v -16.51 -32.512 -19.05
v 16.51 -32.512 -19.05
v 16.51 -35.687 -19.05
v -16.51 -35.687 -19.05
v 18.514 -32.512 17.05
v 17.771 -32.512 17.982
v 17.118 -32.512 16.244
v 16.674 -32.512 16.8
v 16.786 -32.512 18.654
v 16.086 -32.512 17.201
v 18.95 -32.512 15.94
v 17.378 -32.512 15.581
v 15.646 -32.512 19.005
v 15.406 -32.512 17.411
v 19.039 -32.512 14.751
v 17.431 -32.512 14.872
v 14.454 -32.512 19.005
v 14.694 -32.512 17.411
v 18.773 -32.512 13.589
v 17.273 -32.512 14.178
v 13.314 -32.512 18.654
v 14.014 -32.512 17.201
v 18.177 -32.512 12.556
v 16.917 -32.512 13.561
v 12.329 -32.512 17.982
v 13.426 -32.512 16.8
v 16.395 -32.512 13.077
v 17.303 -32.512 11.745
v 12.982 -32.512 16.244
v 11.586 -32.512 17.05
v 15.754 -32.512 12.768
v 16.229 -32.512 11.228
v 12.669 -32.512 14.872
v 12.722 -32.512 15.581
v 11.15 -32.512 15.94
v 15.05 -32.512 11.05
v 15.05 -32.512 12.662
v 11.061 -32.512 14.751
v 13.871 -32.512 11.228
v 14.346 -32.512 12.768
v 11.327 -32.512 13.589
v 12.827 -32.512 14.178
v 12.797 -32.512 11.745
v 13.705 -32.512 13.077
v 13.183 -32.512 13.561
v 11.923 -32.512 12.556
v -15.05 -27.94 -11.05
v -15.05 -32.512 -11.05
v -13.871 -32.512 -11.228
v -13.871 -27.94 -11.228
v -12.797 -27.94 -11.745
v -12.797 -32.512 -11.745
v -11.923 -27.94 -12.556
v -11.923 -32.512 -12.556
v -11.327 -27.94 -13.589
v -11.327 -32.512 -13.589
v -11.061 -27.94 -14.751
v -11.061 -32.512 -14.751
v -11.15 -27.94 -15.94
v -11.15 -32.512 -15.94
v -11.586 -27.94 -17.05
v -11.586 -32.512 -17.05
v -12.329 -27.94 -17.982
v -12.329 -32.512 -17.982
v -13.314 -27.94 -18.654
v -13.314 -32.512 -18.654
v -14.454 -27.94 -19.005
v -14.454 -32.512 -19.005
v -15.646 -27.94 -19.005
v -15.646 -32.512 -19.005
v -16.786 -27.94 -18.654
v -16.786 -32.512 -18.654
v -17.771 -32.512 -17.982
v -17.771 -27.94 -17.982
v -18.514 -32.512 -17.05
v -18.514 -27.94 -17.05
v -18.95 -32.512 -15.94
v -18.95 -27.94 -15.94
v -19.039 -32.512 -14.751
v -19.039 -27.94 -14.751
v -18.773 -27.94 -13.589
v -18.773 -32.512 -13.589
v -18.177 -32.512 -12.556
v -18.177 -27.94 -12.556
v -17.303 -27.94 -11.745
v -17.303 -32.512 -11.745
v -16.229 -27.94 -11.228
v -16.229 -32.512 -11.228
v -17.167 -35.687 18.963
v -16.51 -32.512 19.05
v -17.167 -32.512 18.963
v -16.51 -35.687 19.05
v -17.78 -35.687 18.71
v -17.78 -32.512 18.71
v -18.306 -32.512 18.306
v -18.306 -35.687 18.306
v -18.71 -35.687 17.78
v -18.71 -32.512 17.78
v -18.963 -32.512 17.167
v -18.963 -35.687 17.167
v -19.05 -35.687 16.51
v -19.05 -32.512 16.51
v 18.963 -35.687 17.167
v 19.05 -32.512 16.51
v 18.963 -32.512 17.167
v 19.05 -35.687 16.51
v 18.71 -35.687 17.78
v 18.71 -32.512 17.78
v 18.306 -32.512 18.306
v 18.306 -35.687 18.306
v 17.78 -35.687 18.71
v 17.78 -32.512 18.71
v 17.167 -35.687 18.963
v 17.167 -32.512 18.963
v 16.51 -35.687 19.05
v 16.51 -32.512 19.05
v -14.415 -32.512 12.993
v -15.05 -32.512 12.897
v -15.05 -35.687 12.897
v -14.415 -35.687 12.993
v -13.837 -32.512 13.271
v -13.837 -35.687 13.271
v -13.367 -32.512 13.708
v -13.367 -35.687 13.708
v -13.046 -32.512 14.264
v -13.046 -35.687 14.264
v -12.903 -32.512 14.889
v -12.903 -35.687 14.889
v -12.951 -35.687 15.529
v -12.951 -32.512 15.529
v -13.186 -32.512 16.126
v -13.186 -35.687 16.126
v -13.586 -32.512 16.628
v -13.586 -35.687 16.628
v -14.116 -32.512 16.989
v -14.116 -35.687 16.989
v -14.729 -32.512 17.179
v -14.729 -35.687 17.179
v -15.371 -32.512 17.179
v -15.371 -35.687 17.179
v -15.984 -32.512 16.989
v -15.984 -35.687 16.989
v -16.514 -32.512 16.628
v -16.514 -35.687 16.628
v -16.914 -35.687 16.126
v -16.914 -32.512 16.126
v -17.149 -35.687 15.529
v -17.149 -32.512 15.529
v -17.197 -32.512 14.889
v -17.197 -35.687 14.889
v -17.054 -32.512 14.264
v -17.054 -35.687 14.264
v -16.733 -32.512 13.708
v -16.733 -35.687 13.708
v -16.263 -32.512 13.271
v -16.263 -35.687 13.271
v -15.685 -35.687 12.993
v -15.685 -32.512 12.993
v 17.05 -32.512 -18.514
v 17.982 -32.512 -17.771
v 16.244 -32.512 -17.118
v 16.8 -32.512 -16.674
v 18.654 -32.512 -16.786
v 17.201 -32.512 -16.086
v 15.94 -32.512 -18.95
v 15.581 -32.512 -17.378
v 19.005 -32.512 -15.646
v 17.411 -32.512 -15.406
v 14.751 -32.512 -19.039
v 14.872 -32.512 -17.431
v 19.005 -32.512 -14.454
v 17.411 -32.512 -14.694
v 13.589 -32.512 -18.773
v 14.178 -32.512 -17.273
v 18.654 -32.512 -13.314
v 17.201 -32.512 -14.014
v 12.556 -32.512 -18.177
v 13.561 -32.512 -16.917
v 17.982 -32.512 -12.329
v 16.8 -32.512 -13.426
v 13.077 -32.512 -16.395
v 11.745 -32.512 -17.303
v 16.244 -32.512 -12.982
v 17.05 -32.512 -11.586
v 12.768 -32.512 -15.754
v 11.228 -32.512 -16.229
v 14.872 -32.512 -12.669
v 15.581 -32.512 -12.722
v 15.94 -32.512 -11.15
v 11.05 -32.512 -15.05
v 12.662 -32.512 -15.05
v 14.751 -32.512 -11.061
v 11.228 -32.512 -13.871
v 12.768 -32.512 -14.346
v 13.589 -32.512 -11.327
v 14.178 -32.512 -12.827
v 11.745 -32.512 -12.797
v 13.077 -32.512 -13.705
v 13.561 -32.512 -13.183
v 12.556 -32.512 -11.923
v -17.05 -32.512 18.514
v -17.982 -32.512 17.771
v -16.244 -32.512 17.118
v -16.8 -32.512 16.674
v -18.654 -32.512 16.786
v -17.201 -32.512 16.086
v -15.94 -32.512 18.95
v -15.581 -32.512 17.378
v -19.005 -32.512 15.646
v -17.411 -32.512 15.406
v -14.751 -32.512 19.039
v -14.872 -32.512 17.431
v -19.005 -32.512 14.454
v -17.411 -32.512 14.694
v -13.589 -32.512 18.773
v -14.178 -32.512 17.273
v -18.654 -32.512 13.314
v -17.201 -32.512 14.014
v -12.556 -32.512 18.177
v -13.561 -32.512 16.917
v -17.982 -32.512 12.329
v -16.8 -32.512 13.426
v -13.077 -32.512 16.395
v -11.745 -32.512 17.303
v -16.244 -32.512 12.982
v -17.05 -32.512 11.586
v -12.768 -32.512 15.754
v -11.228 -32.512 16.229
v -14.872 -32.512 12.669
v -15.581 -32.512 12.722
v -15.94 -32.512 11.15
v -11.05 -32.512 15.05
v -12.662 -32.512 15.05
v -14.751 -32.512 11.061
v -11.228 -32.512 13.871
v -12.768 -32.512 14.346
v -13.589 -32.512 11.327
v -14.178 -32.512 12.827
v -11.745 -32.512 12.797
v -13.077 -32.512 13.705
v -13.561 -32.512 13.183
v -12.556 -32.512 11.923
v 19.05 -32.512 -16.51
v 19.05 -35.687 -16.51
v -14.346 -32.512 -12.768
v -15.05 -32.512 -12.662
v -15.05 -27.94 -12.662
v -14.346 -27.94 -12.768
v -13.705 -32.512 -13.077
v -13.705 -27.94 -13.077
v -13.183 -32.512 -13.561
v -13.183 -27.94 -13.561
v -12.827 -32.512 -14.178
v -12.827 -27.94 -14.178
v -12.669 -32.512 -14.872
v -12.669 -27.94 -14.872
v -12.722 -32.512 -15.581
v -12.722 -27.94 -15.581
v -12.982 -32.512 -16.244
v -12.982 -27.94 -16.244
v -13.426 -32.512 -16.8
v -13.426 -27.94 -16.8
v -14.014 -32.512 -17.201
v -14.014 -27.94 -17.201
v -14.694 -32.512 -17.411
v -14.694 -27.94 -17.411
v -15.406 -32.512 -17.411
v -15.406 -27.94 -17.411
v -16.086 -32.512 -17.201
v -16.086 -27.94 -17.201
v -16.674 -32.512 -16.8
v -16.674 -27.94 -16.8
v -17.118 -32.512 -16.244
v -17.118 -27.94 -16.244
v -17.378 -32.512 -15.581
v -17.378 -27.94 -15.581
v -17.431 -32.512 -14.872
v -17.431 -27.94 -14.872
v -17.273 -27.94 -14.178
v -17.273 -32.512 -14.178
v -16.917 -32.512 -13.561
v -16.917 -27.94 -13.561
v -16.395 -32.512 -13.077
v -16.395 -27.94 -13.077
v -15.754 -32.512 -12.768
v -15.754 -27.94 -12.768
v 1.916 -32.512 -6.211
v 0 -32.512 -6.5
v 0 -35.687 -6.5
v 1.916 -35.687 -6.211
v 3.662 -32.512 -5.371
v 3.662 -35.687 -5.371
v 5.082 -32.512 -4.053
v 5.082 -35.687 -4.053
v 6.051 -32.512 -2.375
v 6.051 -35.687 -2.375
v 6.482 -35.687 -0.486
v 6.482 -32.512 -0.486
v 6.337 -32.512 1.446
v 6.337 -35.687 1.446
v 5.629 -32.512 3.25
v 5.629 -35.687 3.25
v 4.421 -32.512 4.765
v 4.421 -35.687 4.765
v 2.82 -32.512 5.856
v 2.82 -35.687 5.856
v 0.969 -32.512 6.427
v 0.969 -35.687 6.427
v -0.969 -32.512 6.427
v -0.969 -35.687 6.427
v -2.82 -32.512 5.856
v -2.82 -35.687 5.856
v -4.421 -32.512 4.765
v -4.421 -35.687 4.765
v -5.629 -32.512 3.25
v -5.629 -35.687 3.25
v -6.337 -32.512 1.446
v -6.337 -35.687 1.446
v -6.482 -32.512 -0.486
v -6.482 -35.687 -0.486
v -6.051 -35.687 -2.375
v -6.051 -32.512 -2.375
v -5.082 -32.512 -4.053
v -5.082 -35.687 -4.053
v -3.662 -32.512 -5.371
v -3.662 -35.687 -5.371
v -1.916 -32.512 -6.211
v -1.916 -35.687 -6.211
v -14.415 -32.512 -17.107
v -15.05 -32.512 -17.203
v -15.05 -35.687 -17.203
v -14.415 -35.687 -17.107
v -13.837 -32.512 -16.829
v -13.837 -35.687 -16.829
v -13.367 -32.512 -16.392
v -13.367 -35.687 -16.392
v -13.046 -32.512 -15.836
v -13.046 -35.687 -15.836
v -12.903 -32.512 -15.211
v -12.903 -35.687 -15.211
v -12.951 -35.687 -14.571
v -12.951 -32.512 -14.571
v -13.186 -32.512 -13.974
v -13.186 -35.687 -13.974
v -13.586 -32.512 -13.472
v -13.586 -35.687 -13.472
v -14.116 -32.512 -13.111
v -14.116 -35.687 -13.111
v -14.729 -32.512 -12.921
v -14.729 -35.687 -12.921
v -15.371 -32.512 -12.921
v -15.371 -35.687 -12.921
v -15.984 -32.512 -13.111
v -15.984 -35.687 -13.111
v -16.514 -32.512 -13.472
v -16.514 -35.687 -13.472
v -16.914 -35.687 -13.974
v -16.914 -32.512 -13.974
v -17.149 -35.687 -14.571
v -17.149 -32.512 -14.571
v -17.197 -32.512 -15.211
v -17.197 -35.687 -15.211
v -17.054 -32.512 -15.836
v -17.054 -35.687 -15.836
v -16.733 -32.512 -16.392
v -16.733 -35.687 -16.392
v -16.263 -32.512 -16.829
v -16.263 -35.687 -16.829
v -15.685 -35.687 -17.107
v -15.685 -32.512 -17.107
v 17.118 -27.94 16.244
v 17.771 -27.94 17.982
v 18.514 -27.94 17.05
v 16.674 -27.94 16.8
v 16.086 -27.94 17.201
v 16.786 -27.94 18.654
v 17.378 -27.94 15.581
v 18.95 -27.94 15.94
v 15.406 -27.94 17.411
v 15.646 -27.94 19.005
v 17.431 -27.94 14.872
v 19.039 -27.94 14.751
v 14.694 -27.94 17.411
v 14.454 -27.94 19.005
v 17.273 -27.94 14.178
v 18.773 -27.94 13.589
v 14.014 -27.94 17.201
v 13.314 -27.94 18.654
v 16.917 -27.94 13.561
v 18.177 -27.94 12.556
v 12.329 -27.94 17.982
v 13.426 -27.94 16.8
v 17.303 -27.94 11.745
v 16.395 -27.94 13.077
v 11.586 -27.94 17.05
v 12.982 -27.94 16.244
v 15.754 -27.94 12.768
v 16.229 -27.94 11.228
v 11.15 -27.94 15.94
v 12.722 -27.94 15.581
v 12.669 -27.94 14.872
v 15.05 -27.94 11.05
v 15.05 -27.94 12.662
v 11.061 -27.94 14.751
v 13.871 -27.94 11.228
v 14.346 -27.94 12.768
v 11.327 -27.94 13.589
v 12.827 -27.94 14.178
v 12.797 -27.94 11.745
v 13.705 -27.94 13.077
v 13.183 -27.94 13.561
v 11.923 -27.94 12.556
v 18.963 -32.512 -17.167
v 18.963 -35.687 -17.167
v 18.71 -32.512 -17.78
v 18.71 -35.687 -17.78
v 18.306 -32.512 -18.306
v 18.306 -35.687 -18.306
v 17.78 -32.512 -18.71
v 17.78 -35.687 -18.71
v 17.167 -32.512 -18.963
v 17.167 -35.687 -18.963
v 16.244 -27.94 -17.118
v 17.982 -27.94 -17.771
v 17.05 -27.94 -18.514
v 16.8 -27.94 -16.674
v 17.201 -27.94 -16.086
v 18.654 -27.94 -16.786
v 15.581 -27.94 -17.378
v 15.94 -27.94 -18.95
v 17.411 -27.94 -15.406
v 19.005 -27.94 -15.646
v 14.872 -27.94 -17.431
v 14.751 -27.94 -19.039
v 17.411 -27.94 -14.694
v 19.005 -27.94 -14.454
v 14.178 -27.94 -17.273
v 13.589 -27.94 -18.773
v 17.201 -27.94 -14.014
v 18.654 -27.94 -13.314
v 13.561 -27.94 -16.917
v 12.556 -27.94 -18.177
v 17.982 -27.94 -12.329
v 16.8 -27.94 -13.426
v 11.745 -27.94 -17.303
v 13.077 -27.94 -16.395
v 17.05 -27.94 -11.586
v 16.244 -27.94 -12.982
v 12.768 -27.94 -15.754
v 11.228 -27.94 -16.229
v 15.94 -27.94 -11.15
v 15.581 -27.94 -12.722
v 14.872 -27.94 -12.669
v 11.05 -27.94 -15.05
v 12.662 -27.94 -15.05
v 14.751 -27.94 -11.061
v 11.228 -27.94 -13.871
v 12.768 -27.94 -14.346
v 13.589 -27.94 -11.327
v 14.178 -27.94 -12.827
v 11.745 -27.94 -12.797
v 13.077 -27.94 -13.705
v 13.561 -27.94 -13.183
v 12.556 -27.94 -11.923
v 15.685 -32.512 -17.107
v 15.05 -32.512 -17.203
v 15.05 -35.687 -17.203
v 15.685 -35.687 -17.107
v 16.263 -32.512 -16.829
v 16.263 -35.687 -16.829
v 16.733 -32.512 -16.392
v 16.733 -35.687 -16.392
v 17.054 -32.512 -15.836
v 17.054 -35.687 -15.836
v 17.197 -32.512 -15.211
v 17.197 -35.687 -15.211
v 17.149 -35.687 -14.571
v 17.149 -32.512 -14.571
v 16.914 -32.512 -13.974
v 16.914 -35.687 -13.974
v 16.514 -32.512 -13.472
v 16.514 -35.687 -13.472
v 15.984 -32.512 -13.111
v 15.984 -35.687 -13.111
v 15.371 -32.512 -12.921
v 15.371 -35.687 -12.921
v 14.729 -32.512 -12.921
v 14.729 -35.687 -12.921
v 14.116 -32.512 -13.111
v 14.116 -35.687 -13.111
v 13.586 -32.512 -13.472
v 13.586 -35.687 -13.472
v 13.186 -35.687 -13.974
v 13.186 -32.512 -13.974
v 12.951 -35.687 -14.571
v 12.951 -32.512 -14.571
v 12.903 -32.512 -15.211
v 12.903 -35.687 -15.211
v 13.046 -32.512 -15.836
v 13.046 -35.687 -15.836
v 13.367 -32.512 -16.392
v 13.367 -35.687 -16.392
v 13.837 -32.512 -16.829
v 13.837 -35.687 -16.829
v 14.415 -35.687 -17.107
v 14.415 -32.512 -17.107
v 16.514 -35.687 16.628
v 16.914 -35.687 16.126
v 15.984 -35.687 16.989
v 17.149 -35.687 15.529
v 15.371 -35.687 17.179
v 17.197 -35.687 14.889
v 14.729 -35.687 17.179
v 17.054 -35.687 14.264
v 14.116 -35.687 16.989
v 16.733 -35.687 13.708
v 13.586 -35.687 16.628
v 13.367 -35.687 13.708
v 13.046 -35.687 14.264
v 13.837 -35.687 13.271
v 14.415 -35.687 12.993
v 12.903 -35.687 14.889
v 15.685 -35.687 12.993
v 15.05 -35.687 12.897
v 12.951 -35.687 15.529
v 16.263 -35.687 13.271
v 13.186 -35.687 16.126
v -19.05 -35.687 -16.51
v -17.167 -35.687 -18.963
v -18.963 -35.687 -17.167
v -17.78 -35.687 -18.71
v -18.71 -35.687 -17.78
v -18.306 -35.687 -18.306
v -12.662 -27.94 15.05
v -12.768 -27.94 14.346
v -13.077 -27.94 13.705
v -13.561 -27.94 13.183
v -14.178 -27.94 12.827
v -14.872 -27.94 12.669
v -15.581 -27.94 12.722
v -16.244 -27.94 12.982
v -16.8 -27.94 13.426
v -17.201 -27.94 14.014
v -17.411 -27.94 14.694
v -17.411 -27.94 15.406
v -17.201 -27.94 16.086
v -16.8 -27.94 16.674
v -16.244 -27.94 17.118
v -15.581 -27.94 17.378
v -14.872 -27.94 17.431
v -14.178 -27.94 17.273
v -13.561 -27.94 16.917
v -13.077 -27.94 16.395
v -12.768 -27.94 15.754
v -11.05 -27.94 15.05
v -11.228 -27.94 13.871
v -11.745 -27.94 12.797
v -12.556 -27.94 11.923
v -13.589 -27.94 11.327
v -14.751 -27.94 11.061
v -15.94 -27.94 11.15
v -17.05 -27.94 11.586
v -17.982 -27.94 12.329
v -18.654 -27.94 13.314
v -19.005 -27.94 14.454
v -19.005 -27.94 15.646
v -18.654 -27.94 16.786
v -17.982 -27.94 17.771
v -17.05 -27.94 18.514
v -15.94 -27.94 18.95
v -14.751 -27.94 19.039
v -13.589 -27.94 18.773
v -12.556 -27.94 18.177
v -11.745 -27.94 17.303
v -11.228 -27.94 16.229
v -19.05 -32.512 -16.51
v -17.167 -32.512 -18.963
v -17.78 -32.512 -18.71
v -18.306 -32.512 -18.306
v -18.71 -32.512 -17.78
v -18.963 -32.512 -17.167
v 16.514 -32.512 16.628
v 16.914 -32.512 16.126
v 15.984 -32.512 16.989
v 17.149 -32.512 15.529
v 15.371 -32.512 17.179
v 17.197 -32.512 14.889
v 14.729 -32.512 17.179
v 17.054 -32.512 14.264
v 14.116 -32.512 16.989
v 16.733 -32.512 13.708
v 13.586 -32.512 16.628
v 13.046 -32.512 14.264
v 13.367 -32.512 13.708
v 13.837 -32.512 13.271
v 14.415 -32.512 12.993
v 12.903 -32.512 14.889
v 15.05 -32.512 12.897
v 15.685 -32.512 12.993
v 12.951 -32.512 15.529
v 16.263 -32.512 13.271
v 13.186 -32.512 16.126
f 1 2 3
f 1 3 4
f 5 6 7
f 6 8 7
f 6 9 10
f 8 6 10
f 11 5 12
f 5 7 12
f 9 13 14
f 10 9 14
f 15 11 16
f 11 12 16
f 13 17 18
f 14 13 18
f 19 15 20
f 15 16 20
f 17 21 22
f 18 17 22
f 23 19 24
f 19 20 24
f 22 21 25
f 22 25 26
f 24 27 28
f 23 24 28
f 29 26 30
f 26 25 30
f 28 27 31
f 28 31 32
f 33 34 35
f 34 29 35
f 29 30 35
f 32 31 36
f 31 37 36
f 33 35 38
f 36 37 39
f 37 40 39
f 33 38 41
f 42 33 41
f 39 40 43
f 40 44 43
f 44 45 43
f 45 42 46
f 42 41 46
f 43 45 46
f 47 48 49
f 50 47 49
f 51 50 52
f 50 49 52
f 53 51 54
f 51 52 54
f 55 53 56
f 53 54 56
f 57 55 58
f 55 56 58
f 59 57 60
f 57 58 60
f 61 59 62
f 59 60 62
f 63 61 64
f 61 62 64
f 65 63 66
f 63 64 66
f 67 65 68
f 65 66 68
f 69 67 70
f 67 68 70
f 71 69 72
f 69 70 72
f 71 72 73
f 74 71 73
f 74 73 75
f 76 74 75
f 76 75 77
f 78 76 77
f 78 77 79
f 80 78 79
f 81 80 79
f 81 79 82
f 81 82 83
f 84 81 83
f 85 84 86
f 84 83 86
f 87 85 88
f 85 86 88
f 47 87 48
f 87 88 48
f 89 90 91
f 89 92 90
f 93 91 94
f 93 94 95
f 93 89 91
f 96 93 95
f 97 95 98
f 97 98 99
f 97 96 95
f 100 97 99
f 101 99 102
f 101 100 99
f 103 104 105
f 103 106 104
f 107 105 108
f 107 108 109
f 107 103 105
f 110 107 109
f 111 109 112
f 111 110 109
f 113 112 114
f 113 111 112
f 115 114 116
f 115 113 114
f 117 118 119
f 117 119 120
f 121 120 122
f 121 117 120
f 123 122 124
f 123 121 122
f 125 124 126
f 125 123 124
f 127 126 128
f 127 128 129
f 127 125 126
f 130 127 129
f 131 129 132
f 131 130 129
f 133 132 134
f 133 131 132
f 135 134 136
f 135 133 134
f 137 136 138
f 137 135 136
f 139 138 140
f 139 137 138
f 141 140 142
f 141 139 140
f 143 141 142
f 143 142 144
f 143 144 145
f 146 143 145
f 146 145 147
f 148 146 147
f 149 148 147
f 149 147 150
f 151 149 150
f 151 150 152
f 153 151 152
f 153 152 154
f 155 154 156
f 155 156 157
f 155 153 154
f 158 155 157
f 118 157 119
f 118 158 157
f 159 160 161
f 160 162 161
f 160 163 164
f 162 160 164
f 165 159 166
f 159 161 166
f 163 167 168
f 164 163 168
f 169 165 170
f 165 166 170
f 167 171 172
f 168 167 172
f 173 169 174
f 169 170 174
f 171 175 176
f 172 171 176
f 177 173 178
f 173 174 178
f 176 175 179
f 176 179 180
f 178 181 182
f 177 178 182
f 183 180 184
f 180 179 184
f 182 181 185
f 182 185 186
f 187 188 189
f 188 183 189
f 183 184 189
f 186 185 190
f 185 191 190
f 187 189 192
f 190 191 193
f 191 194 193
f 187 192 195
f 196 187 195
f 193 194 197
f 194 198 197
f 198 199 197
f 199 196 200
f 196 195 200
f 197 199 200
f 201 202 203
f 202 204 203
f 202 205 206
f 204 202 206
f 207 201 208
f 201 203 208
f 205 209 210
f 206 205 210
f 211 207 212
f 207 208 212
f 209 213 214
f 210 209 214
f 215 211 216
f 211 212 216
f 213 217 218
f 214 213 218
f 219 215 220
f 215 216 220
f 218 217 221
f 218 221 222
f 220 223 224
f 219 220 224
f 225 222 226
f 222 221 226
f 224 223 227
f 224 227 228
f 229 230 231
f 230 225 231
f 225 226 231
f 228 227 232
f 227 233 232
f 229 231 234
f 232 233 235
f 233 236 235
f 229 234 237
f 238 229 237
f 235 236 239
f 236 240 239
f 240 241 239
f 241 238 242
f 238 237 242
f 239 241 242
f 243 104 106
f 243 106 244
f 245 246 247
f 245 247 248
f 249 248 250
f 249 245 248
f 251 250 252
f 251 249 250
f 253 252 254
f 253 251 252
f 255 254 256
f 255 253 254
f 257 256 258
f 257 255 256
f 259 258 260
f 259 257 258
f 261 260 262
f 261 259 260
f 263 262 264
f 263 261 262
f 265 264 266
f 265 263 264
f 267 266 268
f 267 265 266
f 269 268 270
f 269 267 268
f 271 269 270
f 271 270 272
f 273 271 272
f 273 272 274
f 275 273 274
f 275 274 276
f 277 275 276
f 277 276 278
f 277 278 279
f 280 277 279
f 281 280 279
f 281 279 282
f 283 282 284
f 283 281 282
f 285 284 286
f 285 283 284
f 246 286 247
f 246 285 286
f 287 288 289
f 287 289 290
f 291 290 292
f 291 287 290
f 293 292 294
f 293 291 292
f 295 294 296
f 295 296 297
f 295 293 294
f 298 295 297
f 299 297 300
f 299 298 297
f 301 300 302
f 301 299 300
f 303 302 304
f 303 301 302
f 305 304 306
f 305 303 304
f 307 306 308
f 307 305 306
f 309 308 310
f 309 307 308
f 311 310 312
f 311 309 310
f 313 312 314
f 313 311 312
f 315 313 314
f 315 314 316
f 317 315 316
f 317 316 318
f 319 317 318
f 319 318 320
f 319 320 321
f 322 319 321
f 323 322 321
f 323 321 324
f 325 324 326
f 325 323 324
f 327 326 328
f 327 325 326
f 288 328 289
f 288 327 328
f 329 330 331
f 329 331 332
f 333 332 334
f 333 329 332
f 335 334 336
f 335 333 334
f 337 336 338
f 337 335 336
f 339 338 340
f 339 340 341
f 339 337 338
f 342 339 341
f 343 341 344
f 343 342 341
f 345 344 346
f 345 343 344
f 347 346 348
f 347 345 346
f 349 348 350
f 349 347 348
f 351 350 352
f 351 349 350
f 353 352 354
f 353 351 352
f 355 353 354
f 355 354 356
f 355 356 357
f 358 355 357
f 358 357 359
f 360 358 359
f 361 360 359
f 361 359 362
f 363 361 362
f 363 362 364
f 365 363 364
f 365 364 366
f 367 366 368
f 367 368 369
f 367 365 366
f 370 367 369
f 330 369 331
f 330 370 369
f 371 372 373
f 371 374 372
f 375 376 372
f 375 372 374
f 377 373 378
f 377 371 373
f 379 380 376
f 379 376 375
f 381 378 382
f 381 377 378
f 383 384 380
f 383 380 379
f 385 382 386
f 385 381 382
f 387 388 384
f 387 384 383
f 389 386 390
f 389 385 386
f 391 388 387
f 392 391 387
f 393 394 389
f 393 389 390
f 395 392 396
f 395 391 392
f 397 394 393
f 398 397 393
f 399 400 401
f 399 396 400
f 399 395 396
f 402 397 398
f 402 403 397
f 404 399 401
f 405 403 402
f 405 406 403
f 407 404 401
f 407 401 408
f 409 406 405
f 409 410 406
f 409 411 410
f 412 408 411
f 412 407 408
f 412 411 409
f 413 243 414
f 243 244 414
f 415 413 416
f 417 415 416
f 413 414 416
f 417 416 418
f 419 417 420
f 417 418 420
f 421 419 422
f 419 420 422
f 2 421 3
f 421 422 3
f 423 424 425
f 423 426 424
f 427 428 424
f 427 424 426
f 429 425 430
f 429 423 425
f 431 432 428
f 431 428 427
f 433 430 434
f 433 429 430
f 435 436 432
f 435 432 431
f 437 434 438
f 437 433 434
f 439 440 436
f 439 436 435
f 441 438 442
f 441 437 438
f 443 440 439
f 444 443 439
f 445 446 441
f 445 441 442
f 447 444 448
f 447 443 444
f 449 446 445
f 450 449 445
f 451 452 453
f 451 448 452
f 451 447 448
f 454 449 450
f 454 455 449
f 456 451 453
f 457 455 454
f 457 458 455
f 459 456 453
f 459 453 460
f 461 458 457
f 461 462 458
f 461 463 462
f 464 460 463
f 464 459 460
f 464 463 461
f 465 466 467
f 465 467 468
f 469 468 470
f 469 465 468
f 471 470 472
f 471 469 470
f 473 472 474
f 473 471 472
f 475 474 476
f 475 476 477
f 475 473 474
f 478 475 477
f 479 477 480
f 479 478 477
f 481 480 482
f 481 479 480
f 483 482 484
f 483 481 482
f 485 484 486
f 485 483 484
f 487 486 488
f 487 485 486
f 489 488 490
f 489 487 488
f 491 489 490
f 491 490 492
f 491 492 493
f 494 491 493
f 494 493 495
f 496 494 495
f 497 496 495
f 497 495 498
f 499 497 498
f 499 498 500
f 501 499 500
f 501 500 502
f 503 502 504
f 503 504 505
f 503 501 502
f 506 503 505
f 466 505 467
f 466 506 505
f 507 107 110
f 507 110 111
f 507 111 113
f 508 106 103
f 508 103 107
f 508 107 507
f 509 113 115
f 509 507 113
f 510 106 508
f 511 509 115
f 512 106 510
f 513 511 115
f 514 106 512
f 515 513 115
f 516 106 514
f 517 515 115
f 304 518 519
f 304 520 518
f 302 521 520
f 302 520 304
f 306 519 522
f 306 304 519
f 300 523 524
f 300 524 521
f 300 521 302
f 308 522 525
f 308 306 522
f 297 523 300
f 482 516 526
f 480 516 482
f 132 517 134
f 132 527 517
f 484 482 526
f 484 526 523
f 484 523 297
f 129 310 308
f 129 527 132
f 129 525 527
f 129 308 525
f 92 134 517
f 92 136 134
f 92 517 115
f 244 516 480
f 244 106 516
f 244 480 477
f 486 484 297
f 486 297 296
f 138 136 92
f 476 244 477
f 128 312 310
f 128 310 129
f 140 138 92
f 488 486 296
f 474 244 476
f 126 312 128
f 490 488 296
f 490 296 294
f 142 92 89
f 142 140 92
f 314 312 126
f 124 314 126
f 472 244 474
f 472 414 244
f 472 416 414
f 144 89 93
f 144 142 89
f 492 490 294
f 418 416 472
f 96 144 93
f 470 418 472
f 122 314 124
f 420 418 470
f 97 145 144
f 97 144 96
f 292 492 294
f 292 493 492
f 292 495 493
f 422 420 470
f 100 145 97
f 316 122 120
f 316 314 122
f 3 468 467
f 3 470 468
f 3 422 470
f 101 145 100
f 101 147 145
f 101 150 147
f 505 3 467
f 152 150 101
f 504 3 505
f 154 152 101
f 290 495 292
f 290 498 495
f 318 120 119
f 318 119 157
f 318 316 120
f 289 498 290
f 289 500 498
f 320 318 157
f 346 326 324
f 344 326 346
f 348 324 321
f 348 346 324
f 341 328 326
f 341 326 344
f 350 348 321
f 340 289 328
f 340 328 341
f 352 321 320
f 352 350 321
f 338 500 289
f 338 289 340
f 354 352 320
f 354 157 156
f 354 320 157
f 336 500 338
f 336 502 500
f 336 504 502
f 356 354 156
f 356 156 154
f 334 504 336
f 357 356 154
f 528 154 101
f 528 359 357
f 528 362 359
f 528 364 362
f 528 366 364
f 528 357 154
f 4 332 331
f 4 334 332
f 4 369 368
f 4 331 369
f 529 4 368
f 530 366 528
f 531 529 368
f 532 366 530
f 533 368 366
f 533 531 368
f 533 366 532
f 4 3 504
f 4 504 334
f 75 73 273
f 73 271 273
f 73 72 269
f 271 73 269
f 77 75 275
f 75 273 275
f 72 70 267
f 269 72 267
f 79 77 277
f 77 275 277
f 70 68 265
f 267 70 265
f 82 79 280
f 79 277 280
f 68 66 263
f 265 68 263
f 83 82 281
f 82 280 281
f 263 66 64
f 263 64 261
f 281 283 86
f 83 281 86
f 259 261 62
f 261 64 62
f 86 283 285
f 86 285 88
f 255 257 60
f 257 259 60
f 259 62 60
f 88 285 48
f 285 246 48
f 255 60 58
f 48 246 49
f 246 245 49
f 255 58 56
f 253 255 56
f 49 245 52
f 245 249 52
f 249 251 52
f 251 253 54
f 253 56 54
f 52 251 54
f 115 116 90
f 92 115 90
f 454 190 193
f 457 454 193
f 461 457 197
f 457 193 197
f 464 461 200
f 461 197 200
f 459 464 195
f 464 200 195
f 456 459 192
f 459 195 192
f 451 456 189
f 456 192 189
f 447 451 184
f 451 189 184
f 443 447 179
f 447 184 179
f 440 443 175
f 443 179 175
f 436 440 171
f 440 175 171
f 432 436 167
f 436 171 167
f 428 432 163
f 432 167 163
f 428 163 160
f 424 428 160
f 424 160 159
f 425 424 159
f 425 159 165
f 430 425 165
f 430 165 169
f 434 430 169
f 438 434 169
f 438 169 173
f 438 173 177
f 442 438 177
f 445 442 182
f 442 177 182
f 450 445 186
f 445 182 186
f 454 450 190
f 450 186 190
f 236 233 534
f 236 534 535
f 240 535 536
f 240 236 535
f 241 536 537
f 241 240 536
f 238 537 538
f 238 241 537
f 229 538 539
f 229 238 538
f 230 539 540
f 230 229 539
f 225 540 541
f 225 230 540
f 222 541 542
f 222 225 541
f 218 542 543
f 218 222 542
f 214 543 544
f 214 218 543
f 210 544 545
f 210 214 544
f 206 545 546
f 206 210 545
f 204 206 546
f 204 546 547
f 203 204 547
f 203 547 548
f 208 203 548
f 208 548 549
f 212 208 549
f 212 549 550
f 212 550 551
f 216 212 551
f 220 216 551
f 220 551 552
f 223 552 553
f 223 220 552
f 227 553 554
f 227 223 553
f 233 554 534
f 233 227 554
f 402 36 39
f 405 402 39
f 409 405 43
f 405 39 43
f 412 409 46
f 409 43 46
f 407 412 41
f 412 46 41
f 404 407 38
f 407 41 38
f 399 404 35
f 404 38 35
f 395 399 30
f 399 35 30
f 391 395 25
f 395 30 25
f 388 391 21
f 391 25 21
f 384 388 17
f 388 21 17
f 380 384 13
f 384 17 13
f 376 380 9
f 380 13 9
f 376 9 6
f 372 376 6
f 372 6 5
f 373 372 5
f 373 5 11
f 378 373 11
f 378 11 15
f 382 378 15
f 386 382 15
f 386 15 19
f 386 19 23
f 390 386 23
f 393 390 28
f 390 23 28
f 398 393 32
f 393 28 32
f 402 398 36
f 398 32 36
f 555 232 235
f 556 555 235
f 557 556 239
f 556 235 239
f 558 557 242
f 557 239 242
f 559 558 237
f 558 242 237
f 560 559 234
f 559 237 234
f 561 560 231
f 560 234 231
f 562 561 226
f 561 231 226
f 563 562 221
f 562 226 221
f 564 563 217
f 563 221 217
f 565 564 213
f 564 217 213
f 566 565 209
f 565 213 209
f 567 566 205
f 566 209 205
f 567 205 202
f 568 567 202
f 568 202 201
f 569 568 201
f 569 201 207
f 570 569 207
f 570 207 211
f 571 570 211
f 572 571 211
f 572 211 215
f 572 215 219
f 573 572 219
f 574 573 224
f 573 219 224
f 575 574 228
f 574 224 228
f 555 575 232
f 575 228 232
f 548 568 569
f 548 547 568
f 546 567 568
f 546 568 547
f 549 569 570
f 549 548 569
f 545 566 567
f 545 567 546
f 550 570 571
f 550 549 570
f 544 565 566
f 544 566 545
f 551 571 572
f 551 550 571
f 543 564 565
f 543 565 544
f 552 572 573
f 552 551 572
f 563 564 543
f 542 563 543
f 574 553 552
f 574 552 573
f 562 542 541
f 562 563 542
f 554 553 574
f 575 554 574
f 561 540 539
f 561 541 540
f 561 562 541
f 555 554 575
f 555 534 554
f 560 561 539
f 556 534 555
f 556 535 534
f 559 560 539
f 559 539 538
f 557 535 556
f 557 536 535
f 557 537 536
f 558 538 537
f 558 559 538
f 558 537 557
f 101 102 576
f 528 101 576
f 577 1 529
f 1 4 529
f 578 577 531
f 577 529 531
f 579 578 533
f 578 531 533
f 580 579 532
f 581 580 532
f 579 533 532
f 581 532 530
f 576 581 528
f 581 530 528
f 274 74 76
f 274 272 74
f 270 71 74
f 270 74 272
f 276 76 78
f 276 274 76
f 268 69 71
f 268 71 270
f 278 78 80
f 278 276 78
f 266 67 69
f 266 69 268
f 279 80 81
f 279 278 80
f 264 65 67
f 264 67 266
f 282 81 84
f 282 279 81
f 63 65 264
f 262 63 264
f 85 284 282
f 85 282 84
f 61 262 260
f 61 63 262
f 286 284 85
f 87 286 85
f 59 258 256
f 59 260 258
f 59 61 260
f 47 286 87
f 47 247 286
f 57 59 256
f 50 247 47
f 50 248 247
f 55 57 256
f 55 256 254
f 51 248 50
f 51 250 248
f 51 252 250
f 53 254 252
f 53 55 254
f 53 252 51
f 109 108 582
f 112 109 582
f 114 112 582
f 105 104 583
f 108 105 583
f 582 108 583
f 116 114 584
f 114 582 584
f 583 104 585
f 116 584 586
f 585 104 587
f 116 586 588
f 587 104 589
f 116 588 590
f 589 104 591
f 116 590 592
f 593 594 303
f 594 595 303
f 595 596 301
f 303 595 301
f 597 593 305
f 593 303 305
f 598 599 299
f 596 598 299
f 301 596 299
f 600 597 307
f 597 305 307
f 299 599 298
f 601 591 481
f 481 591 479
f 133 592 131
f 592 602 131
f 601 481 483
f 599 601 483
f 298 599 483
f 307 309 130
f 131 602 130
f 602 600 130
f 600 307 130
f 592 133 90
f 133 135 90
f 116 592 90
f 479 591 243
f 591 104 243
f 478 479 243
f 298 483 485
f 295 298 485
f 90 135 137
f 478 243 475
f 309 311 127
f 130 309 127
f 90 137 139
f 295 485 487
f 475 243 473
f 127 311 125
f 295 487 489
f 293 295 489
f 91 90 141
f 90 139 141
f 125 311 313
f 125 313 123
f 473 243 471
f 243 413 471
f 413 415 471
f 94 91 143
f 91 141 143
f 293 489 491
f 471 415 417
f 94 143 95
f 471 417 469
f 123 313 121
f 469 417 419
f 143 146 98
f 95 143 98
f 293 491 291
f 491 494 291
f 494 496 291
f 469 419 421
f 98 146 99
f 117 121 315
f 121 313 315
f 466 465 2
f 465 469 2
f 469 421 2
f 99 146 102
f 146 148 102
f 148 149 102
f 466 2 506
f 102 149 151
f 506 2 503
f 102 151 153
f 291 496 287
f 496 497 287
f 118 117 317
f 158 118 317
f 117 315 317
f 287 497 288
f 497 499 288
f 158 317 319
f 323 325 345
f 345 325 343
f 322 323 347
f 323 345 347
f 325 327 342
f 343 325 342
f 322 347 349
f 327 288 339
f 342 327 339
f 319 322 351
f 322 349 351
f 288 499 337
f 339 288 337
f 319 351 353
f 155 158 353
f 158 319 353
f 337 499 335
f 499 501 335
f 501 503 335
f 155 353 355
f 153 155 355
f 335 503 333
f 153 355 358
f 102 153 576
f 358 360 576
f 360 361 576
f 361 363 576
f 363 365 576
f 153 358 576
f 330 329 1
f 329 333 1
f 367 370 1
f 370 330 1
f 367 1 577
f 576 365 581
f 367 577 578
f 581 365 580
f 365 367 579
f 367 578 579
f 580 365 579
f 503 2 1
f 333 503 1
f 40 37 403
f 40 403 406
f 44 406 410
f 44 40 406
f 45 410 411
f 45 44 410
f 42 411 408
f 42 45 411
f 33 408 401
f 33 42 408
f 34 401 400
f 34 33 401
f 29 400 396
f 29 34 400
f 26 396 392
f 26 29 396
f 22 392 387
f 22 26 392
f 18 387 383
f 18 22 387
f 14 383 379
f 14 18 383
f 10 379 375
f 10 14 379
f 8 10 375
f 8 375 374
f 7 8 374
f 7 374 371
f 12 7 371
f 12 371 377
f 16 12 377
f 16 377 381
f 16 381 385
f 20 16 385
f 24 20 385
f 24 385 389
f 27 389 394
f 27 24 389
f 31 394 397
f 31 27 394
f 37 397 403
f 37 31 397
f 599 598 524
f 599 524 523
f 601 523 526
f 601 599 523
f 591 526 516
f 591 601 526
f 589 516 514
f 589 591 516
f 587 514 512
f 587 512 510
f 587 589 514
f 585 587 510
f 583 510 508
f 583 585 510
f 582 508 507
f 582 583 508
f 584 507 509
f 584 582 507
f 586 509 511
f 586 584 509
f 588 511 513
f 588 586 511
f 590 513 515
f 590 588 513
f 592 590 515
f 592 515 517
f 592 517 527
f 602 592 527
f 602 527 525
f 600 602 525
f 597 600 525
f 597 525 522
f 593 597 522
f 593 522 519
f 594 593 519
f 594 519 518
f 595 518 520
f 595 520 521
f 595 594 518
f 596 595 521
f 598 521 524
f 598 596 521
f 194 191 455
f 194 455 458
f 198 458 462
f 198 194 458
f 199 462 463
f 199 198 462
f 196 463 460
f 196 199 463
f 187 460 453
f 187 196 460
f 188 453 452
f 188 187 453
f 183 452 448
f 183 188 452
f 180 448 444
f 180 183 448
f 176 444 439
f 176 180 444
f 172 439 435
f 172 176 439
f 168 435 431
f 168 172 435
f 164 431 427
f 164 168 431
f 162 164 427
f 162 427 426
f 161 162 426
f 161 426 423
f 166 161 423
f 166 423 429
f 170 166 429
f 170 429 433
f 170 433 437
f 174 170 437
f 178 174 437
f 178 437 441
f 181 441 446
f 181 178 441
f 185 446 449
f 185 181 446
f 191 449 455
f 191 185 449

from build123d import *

# Parameters (mm, degrees)
SKETCH1_W           = 38.1
SKETCH1_H           = 38.1
SKETCH1_R           = 4
SKETCH1_R_2         = 1.5875
SKETCH1_R_3         = 1.25
BOSS_EXTRUDE1_DEPTH = 3.175
SKETCH4_R           = 1.7272
CUT_EXTRUDE2_DEPTH  = 10.795
SKETCH7_R           = 2.15265
CUT_EXTRUDE3_DEPTH  = 28.679008383
CIRPATTERN1_COUNT   = 4
SKETCH6_W           = 38.1
SKETCH6_H           = 38.1
SKETCH6_R           = 6.5
SKETCH6_R_2         = 2.15265
BOSS_EXTRUDE2_DEPTH = 3.175
FILLET1_R           = 2.54
FILLET2_R           = 2.54
SKETCH8_R           = 4
SKETCH8_R_2         = 2.3876
BOSS_EXTRUDE3_DEPTH = 4.572
CIRPATTERN2_COUNT   = 4


with BuildPart() as part:
    # Sketch1 → Boss-Extrude1 (new, symmetric)
    with BuildSketch(Plane(origin=(0, 0, 0), x_dir=(1, 0, 0), z_dir=(0, 1, 0))):
        Rectangle(SKETCH1_W, SKETCH1_H)
        with Locations(Location((0, 0, 0), (0, 0, 270))):
            Circle(SKETCH1_R, mode=Mode.SUBTRACT)
        with Locations(Location((8.838834765, 8.838834765, 0), (0, 0, 270))):
            Circle(SKETCH1_R_2, mode=Mode.SUBTRACT)
        with Locations(Location((8.838834765, -8.838834765, 0), (0, 0, 270))):
            Circle(SKETCH1_R_2, mode=Mode.SUBTRACT)
        with Locations(Location((-8.838834765, -8.838834765, 0), (0, 0, 270))):
            Circle(SKETCH1_R_2, mode=Mode.SUBTRACT)
        with Locations(Location((-8.838834765, 8.838834765, 0), (0, 0, 270))):
            Circle(SKETCH1_R_2, mode=Mode.SUBTRACT)
        with Locations(Location((-14.5, 0, 0), (0, 0, 270))):
            Circle(SKETCH1_R_3, mode=Mode.SUBTRACT)
        with Locations(Location((0, 14.5, 0), (0, 0, 270))):
            Circle(SKETCH1_R_3, mode=Mode.SUBTRACT)
        with Locations(Location((14.5, 0, 0), (0, 0, 270))):
            Circle(SKETCH1_R_3, mode=Mode.SUBTRACT)
        with Locations(Location((0, -14.5, 0), (0, 0, 270))):
            Circle(SKETCH1_R_3, mode=Mode.SUBTRACT)
    extrude(amount=BOSS_EXTRUDE1_DEPTH, both=True)

    # Sketch4 → Cut-Extrude2 (cut)
    with BuildSketch(Plane.XY.offset(19.05)):
        with Locations((-5.55625, 0)):
            Circle(SKETCH4_R)
        with Locations((5.55625, 0)):
            Circle(SKETCH4_R)
    cut_extrude2 = extrude(amount=-CUT_EXTRUDE2_DEPTH, mode=Mode.SUBTRACT)

    # Sketch7 → Cut-Extrude3 (cut, through all)
    with BuildSketch(Plane.XZ.offset(3.175)):
        with Locations(Location((-15.05, 15.05, 0), (0, 0, 270))):
            Circle(SKETCH7_R)
        with Locations(Location((15.05, 15.05, 0), (0, 0, 270))):
            Circle(SKETCH7_R)
        with Locations(Location((15.05, -15.05, 0), (0, 0, 270))):
            Circle(SKETCH7_R)
        with Locations(Location((-15.05, -15.05, 0), (0, 0, 270))):
            Circle(SKETCH7_R)
    extrude(amount=-CUT_EXTRUDE3_DEPTH, mode=Mode.SUBTRACT)

    # CirPattern1: Cut-Extrude2 ×4 about axis
    cirpattern1_axis = Axis((0, 0, 0), (0, 1, 0))
    for i in range(1, CIRPATTERN1_COUNT):
        add(cut_extrude2.rotate(cirpattern1_axis, i * 360 / CIRPATTERN1_COUNT), mode=Mode.SUBTRACT)

    # Fillet1
    fillet1_edges = [part.edges().sort_by_distance(p)[0] for p in [
        (19.05, 0, 19.05),
        (-19.05, 0, 19.05),
        (-19.05, 0, -19.05),
        (19.05, 0, -19.05),
    ]]
    fillet(fillet1_edges, radius=FILLET1_R)


with BuildPart() as body_2:
    # Sketch6 → Boss-Extrude2 (new body)
    with BuildSketch(Plane(origin=(0, -32.512, 0), x_dir=(-1, 0, 0), z_dir=(0, -1, 0))):
        Rectangle(SKETCH6_W, SKETCH6_H)
        with Locations(Location((0, 0, 0), (0, 0, 90))):
            Circle(SKETCH6_R, mode=Mode.SUBTRACT)
        with Locations(Location((-15.05, 15.05, 0), (0, 0, 90))):
            Circle(SKETCH6_R_2, mode=Mode.SUBTRACT)
        with Locations(Location((15.05, 15.05, 0), (0, 0, 90))):
            Circle(SKETCH6_R_2, mode=Mode.SUBTRACT)
        with Locations(Location((15.05, -15.05, 0), (0, 0, 90))):
            Circle(SKETCH6_R_2, mode=Mode.SUBTRACT)
        with Locations(Location((-15.05, -15.05, 0), (0, 0, 90))):
            Circle(SKETCH6_R_2, mode=Mode.SUBTRACT)
    extrude(amount=BOSS_EXTRUDE2_DEPTH)

    # Fillet2
    fillet2_edges = [body_2.edges().sort_by_distance(p)[0] for p in [
        (-19.05, -34.0995, 19.05),
        (19.05, -34.0995, 19.05),
        (19.05, -34.0995, -19.05),
        (-19.05, -34.0995, -19.05),
    ]]
    fillet(fillet2_edges, radius=FILLET2_R)


with BuildPart() as body_3:
    # Sketch8 → Boss-Extrude3 (new body)
    with BuildSketch(Plane(origin=(0, -32.512, 0), x_dir=(1, 0, 0), z_dir=(0, 1, 0))):
        with Locations(Location((-15.05, 15.05, 0), (0, 0, 270))):
            Circle(SKETCH8_R)
        with Locations(Location((-15.05, 15.05, 0), (0, 0, 270))):
            Circle(SKETCH8_R_2, mode=Mode.SUBTRACT)
    extrude(amount=BOSS_EXTRUDE3_DEPTH)


with BuildPart() as cirpattern2_1:
    # CirPattern2: pattern copy
    add(body_3.part.rotate(Axis((0, 0, 0), (0, 1, 0)), 1 * 360 / CIRPATTERN2_COUNT))


with BuildPart() as cirpattern2_2:
    # CirPattern2: pattern copy
    add(body_3.part.rotate(Axis((0, 0, 0), (0, 1, 0)), 2 * 360 / CIRPATTERN2_COUNT))


with BuildPart() as cirpattern2_3:
    # CirPattern2: pattern copy
    add(body_3.part.rotate(Axis((0, 0, 0), (0, 1, 0)), 3 * 360 / CIRPATTERN2_COUNT))


solid = Compound([body_2.part, body_3.part, cirpattern2_1.part, cirpattern2_2.part, cirpattern2_3.part])
